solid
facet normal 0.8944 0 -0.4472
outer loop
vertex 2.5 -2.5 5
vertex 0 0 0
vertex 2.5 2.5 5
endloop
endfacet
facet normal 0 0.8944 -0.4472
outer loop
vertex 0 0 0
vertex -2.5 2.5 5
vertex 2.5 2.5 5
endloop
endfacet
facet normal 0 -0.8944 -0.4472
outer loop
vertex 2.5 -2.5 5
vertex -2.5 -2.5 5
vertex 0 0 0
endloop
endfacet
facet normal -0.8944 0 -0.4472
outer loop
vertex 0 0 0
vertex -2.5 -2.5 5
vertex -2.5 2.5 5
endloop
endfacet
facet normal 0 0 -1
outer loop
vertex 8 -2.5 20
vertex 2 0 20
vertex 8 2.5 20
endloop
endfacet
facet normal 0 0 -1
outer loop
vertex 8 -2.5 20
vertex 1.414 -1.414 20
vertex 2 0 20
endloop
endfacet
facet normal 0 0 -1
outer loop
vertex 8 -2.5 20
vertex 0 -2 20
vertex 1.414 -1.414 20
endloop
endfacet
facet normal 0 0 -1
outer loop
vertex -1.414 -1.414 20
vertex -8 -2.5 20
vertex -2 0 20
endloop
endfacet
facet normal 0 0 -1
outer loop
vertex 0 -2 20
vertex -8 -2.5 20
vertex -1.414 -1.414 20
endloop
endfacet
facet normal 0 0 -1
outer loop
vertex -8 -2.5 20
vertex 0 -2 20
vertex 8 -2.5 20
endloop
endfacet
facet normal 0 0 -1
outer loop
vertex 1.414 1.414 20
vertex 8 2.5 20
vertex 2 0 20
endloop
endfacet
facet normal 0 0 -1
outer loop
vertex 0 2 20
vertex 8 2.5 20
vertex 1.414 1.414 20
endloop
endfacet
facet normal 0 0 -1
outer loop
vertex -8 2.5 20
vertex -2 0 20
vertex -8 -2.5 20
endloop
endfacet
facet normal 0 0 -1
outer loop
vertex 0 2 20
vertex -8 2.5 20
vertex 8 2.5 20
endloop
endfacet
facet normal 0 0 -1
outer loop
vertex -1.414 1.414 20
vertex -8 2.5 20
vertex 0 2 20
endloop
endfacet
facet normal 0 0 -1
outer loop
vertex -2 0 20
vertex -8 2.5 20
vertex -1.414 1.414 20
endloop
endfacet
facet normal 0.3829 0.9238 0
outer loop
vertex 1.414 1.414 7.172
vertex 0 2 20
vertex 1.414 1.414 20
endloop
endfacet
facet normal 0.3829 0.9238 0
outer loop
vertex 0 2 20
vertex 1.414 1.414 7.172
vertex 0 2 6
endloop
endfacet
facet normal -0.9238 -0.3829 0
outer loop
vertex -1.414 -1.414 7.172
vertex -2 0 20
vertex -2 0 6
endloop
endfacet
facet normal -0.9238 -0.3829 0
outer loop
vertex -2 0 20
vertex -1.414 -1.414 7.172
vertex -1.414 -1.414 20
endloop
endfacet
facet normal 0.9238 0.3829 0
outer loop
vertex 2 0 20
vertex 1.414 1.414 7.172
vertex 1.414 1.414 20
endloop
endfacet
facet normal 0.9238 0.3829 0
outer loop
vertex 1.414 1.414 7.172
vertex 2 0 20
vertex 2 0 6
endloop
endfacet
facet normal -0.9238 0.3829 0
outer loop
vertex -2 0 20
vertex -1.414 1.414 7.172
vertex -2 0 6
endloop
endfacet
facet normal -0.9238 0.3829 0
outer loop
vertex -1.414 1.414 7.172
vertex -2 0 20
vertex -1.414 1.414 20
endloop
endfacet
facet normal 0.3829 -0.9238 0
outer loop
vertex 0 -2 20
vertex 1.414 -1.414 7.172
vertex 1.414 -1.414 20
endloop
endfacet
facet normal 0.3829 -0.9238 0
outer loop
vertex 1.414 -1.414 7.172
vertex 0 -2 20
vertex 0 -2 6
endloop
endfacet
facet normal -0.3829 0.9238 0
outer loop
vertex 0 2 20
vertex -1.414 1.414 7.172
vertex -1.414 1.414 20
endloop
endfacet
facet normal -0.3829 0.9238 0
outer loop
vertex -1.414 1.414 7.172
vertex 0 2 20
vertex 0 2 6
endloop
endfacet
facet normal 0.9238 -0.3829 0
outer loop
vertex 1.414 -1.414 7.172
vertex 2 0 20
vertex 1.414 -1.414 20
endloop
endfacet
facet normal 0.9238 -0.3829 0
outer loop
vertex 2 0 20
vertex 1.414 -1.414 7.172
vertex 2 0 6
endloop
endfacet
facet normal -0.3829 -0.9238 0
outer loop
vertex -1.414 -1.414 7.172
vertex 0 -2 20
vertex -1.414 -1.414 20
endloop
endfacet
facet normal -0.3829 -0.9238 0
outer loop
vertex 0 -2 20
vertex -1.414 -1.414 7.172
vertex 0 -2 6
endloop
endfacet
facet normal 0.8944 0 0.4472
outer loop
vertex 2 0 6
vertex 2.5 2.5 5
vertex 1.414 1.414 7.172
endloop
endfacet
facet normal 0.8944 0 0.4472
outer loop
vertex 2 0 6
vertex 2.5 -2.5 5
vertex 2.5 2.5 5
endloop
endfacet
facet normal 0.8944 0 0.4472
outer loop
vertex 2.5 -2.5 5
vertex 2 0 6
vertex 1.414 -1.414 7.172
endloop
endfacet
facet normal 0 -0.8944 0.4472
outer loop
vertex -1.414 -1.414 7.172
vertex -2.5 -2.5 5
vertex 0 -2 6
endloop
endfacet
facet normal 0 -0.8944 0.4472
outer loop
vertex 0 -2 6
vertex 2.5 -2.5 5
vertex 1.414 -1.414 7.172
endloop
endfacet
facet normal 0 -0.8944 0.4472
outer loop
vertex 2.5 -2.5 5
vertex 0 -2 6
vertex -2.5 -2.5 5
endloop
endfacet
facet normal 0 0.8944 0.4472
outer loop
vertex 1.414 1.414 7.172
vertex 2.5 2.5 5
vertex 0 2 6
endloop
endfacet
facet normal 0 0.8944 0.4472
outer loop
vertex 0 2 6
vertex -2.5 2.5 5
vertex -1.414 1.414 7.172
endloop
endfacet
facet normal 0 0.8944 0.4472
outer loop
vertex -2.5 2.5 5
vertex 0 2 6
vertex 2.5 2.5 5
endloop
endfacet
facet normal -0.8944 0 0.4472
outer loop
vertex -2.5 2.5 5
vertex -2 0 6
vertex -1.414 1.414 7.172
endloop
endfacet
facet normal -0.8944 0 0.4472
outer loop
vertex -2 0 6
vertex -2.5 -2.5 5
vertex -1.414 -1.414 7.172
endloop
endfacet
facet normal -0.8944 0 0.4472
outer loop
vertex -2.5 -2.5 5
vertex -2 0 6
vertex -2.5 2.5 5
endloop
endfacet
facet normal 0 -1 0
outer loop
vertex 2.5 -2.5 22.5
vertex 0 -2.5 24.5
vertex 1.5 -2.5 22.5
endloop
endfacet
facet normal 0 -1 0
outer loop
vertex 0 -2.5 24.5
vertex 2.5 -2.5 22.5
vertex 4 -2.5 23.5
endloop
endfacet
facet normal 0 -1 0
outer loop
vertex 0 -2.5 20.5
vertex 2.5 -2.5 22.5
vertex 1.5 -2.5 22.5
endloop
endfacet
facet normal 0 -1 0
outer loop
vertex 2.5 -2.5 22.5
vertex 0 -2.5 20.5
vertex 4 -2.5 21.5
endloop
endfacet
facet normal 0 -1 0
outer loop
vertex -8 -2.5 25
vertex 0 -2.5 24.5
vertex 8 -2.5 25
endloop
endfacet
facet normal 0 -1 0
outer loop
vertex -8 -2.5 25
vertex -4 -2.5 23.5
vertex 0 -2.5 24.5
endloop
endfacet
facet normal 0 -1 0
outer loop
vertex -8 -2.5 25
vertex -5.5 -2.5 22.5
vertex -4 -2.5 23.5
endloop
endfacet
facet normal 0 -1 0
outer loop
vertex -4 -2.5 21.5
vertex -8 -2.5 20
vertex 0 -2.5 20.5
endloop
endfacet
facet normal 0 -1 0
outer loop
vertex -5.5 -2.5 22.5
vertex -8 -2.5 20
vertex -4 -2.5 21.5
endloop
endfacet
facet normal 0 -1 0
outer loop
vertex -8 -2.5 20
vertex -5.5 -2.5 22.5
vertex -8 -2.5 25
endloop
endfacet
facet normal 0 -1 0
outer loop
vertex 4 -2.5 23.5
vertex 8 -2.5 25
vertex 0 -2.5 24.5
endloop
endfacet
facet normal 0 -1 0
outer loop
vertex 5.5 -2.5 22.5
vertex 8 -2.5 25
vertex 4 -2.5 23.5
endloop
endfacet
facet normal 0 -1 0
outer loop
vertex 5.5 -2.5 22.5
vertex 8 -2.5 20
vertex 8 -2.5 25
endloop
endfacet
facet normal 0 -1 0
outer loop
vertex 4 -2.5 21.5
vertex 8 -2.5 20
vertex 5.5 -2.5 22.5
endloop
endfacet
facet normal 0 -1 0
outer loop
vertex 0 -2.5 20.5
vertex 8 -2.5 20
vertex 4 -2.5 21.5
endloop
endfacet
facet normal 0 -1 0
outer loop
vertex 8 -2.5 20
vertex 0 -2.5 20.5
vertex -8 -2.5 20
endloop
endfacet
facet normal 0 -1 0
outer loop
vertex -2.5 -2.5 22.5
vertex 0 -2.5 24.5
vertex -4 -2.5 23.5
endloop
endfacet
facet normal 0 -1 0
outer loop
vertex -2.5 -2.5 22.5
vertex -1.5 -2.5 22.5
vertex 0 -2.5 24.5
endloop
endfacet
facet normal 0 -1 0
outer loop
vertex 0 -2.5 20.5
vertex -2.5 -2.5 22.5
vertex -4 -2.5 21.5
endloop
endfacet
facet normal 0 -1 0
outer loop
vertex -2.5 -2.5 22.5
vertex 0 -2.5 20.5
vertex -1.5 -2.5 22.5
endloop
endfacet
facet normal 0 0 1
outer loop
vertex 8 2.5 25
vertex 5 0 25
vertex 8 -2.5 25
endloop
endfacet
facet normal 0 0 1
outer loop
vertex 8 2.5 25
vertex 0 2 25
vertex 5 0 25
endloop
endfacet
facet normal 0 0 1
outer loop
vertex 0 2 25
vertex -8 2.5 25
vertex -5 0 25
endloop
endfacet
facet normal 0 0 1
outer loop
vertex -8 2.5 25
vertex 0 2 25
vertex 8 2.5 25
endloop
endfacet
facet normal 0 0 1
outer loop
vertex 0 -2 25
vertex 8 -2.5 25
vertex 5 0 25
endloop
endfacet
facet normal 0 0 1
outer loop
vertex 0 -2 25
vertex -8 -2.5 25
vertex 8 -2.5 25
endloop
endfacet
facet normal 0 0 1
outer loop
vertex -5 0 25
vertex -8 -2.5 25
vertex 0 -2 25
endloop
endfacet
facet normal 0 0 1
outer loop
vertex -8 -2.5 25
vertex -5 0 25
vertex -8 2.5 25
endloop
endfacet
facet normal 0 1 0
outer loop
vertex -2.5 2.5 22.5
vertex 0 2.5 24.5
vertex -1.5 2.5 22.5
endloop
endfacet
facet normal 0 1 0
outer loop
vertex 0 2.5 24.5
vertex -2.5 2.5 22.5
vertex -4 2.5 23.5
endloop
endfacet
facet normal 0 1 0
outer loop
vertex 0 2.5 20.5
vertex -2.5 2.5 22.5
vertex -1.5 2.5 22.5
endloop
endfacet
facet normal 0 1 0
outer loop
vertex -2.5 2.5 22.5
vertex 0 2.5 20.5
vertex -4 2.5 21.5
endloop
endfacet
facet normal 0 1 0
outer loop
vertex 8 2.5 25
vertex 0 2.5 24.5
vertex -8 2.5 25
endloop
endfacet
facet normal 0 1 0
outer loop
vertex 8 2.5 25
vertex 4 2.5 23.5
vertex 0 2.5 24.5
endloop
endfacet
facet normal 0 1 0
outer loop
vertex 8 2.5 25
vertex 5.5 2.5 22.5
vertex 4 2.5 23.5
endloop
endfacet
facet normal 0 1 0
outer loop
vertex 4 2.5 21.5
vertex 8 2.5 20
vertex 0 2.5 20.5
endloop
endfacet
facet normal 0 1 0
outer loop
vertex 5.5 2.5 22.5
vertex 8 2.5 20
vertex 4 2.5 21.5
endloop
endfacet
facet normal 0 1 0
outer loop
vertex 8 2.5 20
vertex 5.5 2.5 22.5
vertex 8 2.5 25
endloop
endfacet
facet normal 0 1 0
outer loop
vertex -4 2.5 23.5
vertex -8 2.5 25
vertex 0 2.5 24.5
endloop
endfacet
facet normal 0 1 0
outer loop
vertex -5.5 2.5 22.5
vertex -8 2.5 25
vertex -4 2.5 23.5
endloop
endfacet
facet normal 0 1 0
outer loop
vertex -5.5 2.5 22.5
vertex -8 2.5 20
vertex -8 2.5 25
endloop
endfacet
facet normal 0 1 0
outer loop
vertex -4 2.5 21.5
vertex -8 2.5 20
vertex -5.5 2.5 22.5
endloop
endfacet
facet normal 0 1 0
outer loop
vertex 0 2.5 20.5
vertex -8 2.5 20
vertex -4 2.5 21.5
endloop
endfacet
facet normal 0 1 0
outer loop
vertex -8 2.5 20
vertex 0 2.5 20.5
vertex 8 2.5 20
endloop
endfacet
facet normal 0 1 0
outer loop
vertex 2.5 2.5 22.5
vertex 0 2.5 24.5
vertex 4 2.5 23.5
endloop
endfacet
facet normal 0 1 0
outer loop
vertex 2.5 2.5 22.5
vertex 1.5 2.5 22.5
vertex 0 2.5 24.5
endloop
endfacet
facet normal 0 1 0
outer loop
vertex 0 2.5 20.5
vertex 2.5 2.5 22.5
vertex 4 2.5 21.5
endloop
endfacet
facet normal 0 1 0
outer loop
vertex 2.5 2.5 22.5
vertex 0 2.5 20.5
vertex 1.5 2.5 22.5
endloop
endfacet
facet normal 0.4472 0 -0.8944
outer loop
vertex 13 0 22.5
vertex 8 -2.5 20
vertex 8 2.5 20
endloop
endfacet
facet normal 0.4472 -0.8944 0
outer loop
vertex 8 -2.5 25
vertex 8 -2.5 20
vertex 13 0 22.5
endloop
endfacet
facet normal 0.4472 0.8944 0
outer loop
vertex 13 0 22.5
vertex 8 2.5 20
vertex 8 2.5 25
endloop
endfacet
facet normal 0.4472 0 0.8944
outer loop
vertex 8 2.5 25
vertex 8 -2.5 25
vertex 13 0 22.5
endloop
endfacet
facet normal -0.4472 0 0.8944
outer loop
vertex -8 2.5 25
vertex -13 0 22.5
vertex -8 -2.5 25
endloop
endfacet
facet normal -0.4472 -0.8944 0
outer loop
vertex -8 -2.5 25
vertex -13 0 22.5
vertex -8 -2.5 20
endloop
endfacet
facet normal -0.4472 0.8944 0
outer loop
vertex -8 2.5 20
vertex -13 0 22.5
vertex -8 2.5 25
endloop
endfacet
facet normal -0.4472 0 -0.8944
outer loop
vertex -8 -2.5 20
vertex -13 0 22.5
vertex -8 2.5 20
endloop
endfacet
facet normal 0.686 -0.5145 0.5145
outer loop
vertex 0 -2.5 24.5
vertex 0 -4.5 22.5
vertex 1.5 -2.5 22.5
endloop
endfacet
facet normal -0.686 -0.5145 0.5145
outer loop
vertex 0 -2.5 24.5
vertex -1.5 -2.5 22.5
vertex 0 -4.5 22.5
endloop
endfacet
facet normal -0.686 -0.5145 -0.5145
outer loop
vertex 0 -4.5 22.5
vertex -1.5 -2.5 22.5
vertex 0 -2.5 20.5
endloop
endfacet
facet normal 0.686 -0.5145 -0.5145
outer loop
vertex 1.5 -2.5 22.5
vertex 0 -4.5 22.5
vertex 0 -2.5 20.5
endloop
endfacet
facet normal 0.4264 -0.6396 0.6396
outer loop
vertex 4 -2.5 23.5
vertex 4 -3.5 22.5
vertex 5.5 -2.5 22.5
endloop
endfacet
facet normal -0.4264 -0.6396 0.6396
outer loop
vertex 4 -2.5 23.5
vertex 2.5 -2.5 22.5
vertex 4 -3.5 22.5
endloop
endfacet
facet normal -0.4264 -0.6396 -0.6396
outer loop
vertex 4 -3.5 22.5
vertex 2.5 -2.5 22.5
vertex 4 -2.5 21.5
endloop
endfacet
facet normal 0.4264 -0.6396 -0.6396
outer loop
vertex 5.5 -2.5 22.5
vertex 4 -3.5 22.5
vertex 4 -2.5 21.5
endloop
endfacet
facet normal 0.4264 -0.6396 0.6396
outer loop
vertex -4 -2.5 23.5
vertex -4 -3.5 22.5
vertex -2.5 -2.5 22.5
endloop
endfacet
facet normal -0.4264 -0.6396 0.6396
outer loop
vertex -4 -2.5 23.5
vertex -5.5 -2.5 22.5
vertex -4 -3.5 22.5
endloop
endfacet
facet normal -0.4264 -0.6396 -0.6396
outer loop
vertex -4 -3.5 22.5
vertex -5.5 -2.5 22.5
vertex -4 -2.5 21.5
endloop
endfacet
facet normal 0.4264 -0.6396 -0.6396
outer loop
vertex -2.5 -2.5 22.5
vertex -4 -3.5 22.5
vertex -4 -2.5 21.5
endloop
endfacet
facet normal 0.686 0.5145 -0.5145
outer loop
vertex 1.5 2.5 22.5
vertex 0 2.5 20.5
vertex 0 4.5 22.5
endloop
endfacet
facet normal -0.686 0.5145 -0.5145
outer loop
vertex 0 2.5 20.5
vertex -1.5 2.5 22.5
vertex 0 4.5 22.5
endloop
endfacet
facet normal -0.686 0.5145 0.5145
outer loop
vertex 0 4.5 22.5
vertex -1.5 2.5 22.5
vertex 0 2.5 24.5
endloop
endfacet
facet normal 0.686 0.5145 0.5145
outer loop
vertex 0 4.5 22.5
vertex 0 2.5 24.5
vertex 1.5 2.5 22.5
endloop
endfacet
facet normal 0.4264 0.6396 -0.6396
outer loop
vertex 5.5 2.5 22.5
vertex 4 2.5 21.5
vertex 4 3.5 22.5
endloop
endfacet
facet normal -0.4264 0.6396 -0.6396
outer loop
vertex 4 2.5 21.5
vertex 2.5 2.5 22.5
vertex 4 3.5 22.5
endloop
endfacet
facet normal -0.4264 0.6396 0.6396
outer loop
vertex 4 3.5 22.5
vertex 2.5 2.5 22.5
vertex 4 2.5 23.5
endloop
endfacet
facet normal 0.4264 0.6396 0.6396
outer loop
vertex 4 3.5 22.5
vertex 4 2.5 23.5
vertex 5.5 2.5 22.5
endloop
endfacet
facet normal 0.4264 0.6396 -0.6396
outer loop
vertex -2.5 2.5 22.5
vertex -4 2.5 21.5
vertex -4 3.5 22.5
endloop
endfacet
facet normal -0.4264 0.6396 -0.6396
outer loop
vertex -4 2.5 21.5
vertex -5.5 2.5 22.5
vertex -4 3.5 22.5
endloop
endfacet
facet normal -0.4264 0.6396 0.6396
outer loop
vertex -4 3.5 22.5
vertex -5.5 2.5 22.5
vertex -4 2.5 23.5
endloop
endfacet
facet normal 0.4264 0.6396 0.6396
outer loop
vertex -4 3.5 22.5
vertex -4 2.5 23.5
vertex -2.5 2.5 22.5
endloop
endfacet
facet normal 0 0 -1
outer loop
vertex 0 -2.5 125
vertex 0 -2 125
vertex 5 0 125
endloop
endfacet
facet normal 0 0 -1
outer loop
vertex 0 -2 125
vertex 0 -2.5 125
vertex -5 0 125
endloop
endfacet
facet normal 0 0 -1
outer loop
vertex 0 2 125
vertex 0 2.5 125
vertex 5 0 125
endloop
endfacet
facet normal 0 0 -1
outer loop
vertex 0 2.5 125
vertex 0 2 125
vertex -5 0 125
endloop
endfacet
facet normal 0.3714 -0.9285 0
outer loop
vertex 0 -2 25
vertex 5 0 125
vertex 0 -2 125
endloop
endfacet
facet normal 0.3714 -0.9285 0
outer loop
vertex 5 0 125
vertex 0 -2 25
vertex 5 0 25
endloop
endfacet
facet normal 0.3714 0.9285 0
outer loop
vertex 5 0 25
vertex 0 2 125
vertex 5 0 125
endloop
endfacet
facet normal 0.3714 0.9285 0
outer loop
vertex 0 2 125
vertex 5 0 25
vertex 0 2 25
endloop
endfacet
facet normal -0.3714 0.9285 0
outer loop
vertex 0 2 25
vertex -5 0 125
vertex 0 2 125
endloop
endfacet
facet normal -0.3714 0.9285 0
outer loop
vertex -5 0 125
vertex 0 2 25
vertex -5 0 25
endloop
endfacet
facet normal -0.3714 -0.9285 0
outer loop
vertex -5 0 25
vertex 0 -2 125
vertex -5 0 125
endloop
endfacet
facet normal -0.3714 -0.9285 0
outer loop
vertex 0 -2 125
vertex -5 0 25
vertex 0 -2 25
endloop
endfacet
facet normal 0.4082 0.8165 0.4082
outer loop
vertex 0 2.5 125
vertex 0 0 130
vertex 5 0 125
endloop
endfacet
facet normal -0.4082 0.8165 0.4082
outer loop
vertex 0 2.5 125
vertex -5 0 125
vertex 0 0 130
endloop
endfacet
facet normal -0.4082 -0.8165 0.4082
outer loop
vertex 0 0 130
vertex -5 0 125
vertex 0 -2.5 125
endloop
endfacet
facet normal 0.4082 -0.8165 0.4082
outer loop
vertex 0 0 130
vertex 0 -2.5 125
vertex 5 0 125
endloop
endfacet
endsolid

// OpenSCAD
module prism(x, y, z, l, w, h, xRot, yRot, zRot, color)
{
    color(c=color, alpha=1) { translate([x, y, z]) { rotate([xRot, yRot, zRot]) {
        polyhedron( points=[
                        [0,0,0], [l,0,0], [l,w,0],
                        [0,w,0], [0,w,h], [l,w,h]],
                    faces=[
                        [0,1,2,3],[5,4,3,2],[0,4,5,1],
                        [0,3,4],[5,2,1]]
        );
    }}}
}
module pyramid(x, y, z, l, w, h, xRot, yRot, zRot, color)
{
    color(c=color, alpha=1) { translate([x, y, z]) { rotate([xRot, yRot, zRot]) {
        polyhedron( points=[
                        [l/2, w/2, 0], [l/2, -w/2, 0],
                        [-l/2, -w/2,0], [-l/2, w/2, 0],
                        [0, 0, h]],
                    faces=[
                        [0,1,4],[1,2,4],[2,3,4],[3,0,4],
                        [1,0,3],[2,1,3]]
        );
    }}}
}
module diamond(x, y, z, l, w, h, xRot, yRot, zRot, color)
{
    color(c=color, alpha=1) { translate([x, y, z]) { rotate([xRot, yRot, zRot]) {
            polyhedron( points=[
                            [l/2, 0, 0], [0, w/2, 0],
                            [-l/2, 0,0], [0, -w/2, 0],
                            [0, 0, h]],
                        faces=[
                            [0,1,4],[1,2,4],[2,3,4],[3,0,4],
                            [1,0,3],[2,1,3]]
        );
    }}}
}

module cylinder(x, y, z, r, h, xRot, yRot, zRot, color)
{
    color(c=color, alpha=1) { translate([x, y, z]) { rotate([xRot, yRot, zRot]) {
        polyhedron( points=[
                        [0,0,0], [0,0,h],
                        [r*cos(0), r*sin(0), 0],
                        [r*cos(0), r*sin(0), h],
                        [r*cos(45), r*sin(45), 0],
                        [r*cos(45), r*sin(45), h],
                        [r*cos(90), r*sin(90), 0],
                        [r*cos(90), r*sin(90), h],
                        [r*cos(135), r*sin(135), 0],
                        [r*cos(135), r*sin(135), h],
                        [r*cos(180), r*sin(180), 0],
                        [r*cos(180), r*sin(180), h],
                        [r*cos(225), r*sin(225), 0],
                        [r*cos(225), r*sin(225), h],
                        [r*cos(270), r*sin(270), 0],
                        [r*cos(270), r*sin(270), h],
                        [r*cos(315), r*sin(315), 0],
                        [r*cos(315), r*sin(315), h]],
                    faces=[
                        [2,3,4],[0,2,4],[4,3,5],[3,1,5],
                        [4,5,6],[0,4,6],[6,5,7],[5,1,7],
                        [6,7,8],[0,6,8],[8,7,9],[7,1,9],
                        [8,9,10],[0,8,10],[10,9,11],[9,1,11],
                        [10,11,12],[0,10,12],[12,11,13],[11,1,13],
                        [12,13,14],[0,12,14],[14,13,15],[13,1,15],
                        [14,15,16],[0,14,16],[16,15,17],[15,1,17],
                        [16,17,2],[0,16,2],[2,17,3],[17,1,3]]
        );
    }}}
}

module rectangle(x, y, z, l, w, h, xRot, yRot, zRot, color)
{
    color(c=color, alpha=1) { translate([x, y, z]) { rotate([xRot, yRot, zRot]) {
        polyhedron( points = [
                        [-l/2, -w/2, 0],
                        [-l/2, -w/2, h],
                        [-l/2, w/2, 0],
                        [-l/2, w/2, h],
                        [l/2, -w/2, 0],
                        [l/2, -w/2, h],
                        [l/2, w/2, 0],
                        [l/2, w/2, h]],
                    faces = [
                        [0,1,2],[0,4,1],[0,2,4],
                        [3,2,1],[5,1,4],[1,5,3],
                        [6,4,2],[6,5,4],[2,3,6],
                        [7,5,6],[6,3,7],[7,3,5]]
        );
    }}}
}
length = 5;
width = 5;
pyramid(0, 0, 5, length, width, 5, 180, 0, 0, [1,1,0]);
cylinder(0, 0, 5, 2, 15, 0, 0, 0, [0.5,0.5,0.5]);
pyramid(0, 0, 5, 5, length, width, 0, 0, 0, [1,1,0]);
rectangle(0, 0, 20, 16, 5, 5, 0, 0, 0, [1,1,0]);
pyramid(8, 0, 22.5, length, width, 5, 0, 90, 0, [1,1,0]);
pyramid(-8, 0, 22.5, length, width, 5, 0, 270, 0, [1,1,0]);
diamond(0, -2.5, 22.5, 3, 4, 2, 90, 0, 0, [0,0,1]);
diamond(4, -2.5, 22.5, 3, 2, 1, 90, 0, 0, [0,1,0]);
diamond(-4, -2.5, 22.5, 3, 2, 1, 90, 0, 0, [0,1,0]);
diamond(0, 2.5, 22.5, 3, 4, 2, 270, 0, 0, [0,0,1]);
diamond(4, 2.5, 22.5, 3, 2, 1, 270, 0, 0, [0,1,0]);
diamond(-4, 2.5, 22.5, 3, 2, 1, 270, 0, 0, [0,1,0]);

prism(5, 0, 25, 100, 5, 2, 0, 270, 90, [0.5,0.5,0.5]);
prism(5, 0, 125, 100, 5, 2, 0, 90, 90, [0.5,0.5,0.5]);
prism(-5, 0, 25, 100, 5, 2, 0, 270, 270, [0.5,0.5,0.5]);
prism(-5, 0, 125, 100, 5, 2, 0, 90, 270, [0.5,0.5,0.5]);
diamond(0, 0, 125, 10, 5, 5, 0, 0, 0, [0.5,0.5,0.5]);




echo(version=version());
